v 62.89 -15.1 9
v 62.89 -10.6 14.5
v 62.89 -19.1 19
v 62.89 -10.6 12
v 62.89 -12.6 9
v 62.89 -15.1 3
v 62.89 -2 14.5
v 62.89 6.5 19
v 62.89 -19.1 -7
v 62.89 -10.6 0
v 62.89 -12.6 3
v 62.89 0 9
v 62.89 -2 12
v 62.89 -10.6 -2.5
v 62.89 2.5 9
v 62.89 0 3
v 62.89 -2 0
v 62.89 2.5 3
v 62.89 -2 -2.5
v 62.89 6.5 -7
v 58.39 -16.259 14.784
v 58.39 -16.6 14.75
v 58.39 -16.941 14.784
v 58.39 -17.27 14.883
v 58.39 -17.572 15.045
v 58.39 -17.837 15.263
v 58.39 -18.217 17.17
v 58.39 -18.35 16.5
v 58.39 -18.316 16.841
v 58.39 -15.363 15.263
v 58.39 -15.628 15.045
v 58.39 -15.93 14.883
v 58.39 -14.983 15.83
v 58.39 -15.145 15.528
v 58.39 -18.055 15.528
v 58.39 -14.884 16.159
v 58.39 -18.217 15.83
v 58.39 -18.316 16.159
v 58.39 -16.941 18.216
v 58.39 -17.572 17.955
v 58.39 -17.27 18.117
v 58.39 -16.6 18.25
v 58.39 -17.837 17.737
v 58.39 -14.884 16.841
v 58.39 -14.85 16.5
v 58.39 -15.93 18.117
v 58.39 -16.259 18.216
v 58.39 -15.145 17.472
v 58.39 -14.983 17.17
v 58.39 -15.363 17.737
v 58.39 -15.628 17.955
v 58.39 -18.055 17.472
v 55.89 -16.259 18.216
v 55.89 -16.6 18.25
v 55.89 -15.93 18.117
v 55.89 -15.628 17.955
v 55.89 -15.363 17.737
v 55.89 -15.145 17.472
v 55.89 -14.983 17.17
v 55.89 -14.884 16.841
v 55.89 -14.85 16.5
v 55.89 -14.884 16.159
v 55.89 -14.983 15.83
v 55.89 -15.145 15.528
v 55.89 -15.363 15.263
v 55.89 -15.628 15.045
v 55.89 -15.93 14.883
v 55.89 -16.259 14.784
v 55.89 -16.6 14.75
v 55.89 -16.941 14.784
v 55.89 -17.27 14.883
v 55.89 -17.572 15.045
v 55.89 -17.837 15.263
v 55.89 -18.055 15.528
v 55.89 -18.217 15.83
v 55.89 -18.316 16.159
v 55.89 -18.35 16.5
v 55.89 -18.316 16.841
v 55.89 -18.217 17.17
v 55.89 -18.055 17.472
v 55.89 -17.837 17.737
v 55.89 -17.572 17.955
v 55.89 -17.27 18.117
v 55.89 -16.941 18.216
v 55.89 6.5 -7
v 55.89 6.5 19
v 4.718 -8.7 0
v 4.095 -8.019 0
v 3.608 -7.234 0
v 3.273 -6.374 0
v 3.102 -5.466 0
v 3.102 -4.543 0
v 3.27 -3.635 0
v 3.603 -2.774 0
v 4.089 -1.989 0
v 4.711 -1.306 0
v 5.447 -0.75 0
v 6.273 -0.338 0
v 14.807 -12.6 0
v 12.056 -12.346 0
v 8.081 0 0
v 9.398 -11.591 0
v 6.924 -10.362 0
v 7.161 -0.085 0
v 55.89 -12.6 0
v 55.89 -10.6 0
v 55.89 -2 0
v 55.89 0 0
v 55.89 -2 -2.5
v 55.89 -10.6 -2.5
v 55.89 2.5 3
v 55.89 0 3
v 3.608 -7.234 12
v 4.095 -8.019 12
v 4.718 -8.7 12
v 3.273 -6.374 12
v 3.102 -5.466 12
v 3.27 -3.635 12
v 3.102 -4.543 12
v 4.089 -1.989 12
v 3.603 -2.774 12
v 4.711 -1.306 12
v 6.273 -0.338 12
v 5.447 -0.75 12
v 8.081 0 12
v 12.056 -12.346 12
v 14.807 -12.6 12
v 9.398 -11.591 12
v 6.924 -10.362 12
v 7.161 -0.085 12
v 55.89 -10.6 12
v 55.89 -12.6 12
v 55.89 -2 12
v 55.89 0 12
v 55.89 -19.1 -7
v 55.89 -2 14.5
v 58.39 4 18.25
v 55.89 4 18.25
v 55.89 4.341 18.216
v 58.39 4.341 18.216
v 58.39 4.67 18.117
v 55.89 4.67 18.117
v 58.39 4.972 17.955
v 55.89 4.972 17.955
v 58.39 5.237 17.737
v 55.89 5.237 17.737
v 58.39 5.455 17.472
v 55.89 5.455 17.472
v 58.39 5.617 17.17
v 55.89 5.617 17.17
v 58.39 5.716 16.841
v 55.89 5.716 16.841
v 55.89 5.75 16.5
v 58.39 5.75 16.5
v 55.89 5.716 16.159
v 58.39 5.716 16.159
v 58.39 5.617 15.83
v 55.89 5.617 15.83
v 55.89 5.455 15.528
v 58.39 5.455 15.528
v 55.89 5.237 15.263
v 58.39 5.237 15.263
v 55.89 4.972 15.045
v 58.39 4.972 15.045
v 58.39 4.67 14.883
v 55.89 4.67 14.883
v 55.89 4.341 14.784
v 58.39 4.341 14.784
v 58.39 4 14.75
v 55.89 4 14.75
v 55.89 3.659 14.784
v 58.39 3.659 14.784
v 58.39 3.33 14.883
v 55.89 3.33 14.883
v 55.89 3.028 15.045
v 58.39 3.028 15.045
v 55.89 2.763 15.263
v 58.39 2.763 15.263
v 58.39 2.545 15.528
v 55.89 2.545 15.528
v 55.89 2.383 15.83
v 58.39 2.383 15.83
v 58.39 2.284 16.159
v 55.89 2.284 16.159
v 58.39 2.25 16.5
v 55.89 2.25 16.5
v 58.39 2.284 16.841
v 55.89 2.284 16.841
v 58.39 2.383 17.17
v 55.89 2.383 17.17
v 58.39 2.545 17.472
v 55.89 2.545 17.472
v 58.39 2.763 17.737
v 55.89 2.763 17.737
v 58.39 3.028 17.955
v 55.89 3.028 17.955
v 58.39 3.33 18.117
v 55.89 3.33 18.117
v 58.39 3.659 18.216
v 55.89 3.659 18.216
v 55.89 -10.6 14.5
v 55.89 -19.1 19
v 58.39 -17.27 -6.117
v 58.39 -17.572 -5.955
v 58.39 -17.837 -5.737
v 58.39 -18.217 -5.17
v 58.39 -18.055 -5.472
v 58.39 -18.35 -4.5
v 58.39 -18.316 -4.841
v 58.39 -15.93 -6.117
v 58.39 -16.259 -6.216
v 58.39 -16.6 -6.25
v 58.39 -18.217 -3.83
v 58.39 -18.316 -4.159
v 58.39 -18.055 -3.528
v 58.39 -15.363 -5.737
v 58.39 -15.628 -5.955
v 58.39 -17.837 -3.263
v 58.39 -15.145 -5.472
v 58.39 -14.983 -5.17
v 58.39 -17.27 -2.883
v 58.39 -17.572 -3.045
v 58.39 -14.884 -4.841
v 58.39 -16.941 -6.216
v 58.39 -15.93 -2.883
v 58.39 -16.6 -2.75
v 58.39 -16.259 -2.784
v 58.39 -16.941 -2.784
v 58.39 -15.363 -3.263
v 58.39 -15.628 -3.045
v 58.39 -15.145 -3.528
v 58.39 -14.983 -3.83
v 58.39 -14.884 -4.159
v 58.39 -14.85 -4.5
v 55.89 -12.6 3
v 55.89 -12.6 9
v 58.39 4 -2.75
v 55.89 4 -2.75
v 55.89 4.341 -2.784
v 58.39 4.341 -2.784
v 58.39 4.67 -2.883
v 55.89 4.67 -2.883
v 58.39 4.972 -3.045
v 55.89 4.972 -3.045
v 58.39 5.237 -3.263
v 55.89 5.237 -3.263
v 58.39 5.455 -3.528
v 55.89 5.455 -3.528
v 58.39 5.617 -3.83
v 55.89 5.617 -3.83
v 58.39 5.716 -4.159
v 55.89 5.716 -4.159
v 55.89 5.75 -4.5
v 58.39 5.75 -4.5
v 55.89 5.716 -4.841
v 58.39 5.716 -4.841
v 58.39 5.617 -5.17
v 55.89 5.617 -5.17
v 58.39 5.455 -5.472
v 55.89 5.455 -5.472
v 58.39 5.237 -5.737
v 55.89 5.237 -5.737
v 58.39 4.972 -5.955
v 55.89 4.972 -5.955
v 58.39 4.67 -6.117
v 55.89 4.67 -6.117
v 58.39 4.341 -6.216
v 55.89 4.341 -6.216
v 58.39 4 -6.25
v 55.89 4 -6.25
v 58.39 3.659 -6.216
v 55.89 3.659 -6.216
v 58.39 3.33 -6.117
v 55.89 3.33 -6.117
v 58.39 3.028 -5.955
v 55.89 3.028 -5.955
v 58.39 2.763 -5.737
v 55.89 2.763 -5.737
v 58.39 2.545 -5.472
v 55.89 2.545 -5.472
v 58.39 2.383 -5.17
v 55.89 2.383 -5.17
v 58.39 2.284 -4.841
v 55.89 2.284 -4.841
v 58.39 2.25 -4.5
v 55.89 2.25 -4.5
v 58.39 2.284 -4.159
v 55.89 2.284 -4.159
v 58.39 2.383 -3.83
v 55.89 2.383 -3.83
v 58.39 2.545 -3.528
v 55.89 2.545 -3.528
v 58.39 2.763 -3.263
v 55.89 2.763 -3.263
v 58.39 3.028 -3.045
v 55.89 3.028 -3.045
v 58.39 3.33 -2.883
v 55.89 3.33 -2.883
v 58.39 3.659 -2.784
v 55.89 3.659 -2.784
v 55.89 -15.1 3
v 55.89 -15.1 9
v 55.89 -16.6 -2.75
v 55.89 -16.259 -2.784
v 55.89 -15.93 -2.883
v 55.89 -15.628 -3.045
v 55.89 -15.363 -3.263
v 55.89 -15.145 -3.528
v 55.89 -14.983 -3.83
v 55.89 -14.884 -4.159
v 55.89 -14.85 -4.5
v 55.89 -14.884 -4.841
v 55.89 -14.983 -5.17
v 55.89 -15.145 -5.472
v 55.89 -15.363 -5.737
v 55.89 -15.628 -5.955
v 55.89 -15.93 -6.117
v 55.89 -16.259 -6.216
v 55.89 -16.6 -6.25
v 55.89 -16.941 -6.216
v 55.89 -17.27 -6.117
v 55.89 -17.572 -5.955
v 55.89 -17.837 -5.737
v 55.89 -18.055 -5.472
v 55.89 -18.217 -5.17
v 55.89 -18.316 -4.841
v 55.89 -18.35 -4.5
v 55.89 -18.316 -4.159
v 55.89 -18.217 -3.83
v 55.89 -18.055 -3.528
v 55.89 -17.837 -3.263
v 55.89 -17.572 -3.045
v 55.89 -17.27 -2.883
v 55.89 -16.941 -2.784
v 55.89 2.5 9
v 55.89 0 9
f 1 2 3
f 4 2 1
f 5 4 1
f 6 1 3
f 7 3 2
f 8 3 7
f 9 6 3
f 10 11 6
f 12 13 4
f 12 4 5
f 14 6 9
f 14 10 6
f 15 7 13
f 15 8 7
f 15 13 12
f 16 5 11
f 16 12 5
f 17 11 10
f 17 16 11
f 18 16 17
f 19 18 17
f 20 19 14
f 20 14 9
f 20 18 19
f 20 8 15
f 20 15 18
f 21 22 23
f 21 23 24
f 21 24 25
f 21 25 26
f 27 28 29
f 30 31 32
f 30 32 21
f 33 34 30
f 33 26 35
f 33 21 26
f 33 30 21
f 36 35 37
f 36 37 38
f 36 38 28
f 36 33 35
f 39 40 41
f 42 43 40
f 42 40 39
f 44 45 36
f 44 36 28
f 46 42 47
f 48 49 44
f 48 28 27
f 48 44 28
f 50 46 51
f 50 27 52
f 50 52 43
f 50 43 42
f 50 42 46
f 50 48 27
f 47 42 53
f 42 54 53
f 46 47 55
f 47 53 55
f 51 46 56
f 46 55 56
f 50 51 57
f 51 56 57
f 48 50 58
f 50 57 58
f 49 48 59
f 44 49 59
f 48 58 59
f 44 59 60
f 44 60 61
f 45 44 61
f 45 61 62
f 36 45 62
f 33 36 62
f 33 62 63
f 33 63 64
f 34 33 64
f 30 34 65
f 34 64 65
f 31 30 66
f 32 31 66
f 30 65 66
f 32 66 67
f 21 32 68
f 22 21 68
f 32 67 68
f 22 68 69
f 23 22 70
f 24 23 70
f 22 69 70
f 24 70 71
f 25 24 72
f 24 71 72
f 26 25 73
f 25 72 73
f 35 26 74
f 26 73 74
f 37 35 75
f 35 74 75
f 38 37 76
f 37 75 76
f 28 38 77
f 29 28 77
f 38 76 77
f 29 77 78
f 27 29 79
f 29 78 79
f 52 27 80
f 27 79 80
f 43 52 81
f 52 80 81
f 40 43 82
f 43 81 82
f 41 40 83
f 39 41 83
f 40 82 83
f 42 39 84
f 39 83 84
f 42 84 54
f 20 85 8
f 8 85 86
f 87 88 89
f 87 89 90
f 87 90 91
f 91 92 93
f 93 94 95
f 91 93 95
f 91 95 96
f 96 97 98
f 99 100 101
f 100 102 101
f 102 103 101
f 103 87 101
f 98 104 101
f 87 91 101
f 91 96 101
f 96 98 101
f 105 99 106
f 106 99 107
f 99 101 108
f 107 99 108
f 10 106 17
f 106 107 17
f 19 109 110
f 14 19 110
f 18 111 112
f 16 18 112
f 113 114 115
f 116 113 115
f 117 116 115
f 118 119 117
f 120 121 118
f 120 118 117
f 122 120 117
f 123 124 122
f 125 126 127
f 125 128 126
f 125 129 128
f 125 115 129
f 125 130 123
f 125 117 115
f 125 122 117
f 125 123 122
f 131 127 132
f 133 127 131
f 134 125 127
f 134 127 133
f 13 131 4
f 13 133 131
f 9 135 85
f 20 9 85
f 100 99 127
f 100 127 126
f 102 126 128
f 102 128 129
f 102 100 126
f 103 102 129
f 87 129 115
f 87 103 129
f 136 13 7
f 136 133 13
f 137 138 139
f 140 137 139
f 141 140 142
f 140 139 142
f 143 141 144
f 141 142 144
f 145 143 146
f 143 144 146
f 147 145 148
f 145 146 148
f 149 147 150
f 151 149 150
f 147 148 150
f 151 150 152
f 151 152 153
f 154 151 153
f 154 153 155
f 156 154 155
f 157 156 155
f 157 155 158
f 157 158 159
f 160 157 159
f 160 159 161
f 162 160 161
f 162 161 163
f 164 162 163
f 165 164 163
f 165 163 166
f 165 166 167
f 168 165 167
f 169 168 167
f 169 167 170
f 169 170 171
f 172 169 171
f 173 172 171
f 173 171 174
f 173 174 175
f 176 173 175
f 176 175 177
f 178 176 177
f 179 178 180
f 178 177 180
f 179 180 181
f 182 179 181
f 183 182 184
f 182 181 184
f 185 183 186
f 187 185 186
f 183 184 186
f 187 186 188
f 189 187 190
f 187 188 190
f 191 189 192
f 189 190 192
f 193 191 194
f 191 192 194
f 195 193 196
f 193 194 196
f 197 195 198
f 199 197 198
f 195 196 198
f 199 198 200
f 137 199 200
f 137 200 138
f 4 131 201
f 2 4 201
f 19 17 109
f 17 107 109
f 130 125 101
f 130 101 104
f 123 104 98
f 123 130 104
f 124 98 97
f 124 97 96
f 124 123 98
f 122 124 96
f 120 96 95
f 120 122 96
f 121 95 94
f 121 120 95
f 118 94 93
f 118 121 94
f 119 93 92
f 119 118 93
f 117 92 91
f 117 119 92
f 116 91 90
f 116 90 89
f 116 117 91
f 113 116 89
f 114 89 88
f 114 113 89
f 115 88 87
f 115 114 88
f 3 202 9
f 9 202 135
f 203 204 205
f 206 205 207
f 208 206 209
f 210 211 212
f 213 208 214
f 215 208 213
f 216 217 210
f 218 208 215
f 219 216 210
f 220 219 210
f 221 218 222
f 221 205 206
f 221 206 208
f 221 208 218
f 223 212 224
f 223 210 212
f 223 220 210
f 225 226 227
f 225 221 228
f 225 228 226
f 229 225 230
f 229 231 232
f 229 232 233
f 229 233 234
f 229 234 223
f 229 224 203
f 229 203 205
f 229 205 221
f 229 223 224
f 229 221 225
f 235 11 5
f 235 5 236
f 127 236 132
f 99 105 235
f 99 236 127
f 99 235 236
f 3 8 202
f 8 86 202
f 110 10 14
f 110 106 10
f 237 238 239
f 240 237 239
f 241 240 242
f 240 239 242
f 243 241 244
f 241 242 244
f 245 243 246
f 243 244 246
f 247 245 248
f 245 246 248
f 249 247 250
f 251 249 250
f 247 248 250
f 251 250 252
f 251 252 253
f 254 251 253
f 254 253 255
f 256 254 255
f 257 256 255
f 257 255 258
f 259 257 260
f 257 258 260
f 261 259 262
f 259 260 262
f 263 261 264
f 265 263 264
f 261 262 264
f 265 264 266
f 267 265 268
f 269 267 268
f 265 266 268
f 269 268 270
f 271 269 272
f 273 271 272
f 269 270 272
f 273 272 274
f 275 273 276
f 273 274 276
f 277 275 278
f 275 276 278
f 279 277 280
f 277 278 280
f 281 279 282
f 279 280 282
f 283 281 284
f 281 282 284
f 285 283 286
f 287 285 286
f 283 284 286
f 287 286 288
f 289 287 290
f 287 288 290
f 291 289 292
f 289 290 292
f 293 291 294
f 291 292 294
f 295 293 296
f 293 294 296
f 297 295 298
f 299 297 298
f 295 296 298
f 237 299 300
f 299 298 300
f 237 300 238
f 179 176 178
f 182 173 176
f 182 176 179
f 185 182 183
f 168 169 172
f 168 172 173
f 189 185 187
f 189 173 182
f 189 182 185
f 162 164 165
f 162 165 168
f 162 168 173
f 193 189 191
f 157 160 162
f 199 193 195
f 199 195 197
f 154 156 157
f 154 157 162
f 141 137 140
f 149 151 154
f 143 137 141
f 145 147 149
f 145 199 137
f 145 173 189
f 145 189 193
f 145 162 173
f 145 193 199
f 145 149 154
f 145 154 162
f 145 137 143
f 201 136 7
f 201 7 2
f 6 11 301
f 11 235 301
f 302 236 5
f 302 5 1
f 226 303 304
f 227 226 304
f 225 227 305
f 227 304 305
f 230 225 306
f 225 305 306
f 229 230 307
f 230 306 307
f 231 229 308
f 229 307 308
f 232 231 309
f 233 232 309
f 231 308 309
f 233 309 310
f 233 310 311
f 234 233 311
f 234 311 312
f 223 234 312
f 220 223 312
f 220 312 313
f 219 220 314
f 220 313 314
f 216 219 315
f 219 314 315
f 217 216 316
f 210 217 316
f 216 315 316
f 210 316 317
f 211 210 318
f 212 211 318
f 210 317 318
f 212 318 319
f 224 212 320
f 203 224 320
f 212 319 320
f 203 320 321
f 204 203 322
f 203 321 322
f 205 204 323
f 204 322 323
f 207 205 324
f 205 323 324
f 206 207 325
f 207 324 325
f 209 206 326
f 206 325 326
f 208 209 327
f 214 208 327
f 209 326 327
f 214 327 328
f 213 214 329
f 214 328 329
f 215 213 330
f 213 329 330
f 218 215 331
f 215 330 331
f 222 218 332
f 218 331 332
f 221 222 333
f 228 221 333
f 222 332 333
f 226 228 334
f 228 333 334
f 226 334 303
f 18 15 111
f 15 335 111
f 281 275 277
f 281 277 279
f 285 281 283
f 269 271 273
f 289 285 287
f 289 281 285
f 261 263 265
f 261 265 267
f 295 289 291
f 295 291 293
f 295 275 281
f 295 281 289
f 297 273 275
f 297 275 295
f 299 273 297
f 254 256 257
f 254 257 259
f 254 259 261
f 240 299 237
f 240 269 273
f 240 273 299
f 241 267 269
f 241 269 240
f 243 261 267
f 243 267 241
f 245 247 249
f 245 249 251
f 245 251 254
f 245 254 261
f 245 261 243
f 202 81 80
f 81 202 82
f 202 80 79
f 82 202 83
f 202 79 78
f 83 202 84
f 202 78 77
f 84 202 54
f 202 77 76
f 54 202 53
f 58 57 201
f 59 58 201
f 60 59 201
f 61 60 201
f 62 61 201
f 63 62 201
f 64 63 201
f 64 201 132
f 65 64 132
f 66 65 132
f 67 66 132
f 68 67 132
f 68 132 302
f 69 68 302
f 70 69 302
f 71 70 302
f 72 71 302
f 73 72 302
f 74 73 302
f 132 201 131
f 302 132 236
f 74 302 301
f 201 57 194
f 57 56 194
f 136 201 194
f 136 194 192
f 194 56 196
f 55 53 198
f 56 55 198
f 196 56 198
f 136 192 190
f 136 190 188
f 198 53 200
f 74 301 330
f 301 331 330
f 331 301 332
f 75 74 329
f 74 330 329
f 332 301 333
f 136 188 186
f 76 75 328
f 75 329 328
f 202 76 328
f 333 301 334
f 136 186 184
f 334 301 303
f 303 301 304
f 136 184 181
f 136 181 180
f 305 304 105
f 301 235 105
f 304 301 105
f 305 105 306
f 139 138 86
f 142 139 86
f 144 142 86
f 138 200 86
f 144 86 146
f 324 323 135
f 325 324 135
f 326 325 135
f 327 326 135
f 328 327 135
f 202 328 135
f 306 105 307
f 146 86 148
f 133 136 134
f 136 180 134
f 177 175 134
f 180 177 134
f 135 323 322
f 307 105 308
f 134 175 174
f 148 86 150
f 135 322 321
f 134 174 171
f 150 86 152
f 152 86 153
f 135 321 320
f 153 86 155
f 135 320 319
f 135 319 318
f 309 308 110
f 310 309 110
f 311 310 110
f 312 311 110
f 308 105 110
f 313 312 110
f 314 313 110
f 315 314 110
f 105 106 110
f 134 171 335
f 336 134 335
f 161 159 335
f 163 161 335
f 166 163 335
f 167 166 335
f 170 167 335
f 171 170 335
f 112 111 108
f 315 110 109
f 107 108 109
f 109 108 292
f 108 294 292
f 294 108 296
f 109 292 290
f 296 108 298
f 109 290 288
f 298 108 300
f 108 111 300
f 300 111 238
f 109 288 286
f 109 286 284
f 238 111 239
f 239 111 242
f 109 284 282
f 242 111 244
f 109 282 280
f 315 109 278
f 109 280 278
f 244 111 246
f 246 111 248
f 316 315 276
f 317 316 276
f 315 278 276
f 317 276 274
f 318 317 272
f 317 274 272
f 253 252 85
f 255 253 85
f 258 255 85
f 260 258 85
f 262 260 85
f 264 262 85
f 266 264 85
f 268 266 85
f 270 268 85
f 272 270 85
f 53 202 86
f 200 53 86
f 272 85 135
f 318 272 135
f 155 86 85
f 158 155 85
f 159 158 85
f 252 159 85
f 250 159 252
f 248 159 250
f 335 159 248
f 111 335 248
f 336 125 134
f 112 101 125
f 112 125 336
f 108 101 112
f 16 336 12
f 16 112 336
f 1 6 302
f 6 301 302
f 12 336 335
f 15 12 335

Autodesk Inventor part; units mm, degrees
ref_plane "YZ Plane" through (0, 0, 0) normal (1, 0, 0) x (0, 1, 0)
ref_plane "XZ Plane" through (0, 0, 0) normal (0, 1, 0) x (-1, 0, 0)
ref_plane "XY Plane" through (0, 0, 0) normal (0, 0, 1) x (1, 0, 0)
sketch "Sketch5" plane through (0, 0, 0) normal (0, 0, 1) x (1, 0, 0)
  line L0 (48.5, 0) -> (3.8, 0)
  line L1 (48.5, -12.6) -> (3.8, -12.6)
  line L2 (3.8, -12.6) -> (0, -12.6)
  line L3 (0, -12.6) -> (0, 0)
  line L4 (0, 0) -> (7.8, 0)
  line L5 (38.5, 0) -> (38.5, -12.6)
  line L6 (37.5, -12.6) -> (37.5, 0)
  line L7 (0, -45.1294) -> (0, -34.3361)
  line L8 (0, -34.3361) -> (38.5, -34.3361)
  line L9 (38.5, -34.3361) -> (38.5, -45.1294)
  line L10 (38.5, -45.1294) -> (0, -45.1294)
  line L11 (38.5, -42.4105) -> (39.5, -42.4105)
  line L12 (39.5, -42.4105) -> (39.5, -38.1261)
  line L13 (39.5, -38.1261) -> (38.5, -38.1261)
  line L14 (39.5, -42.4105) -> (39.5, -49.5786)
  line L15 (39.5, -49.5786) -> (45, -49.5786)
  line L16 (45, -49.5786) -> (45, -34.3361)
  line L17 (45, -34.3361) -> (39.5, -34.3361)
  line L18 (39.5, -34.3361) -> (39.5, -38.1261)
  line L19 (48.5, 0) -> (55.8897, 0)
  line L20 (55.8897, 0) -> (55.8897, -12.6)
  line L21 (55.8897, -12.6) -> (48.5, -12.6)
  point P0 (7.8, 0)
  point P1 (39, -42.4105)
  dimension "d63" = 44.7
  dimension "d71" = 0
  dimension "d97" = 12.6
  dimension "d123" = 1
  dimension "d124" = 37.5
  dimension "d125" = 38.5
  dimension "d127" = 1
  dimension "d128" = 5.5
extrude "Extrusion2" add sketch "Sketch5" along normal blind 12 contours L19 L20 L21 L1 L5 L0 | L5 L1 L6 L0 | L6 L1 L2 L3 L4 L0
fillet "Fillet2" radius 15 1 edges at (0, -12.6, 6)
fillet "Rundung3" radius 5 1 edges at (0, 0, 6)
sketch "Skizze17" plane through (55.8897, -12.6, 0) normal (1, 0, 0) x (0, 0, -1)
  line L0 (-19, -6.5) -> (7, -6.5)
  line L1 (7, -6.5) -> (7, 19.1)
  line L2 (7, 19.1) -> (-19, 19.1)
  line L3 (-19, 19.1) -> (-19, -6.5)
  line L4 (-19, -6.5) -> (7, 19.1) construction
  line L5 (7, -6.5) -> (-19, 19.1) construction
  line L6 (0, 12.6) -> (-12, 12.6) projected
  line L7 (0, 0) -> (-12, 0) projected
  line L8 (0, 0) -> (0, 12.6) projected
  line L9 (-12, 0) -> (-12, 12.6) projected
  point P0 (-6, 6.3)
  point P1 (7, 6.3)
  dimension "d151" = 26
  dimension "d152" = 25.6
  dimension "d153" = 6.5
  dimension "d154" = 6.5
  dimension "d155" = 7
  dimension "d156" = 7
extrude "Extrusion12" add sketch "Skizze17" along normal blind 7 contours L3 L2 L1 L0 | L8 L7 L9 L6
sketch "Skizze18" plane through (55.8897, -12.6, 0) normal (-1, 0, 0) x (0, 0, 1)
  circle A0 centre (-4.5, 16.6) radius 1.75
  circle A1 centre (16.5, 16.6) radius 1.75
  circle A2 centre (16.5, -4) radius 1.75
  circle A3 centre (-4.5, -4) radius 1.75
  line L0 (-7, 19.1) -> (19, 19.1) projected
  line L1 (-7, -6.5) -> (-7, 19.1) projected
  line L2 (19, 19.1) -> (19, -6.5) projected
  line L3 (19, -6.5) -> (-7, -6.5) projected
  point P0 (0, 12.6)
  dimension "d135" = 3.5
  dimension "d136" = 2.5
  dimension "d137" = 2.5
  dimension "d138" = 3.5
  dimension "d139" = 2.5
  dimension "d140" = 2.5
  dimension "d141" = 2.5
  dimension "d142" = 2.5
  dimension "d143" = 2.5
  dimension "d144" = 2.5
  dimension "d145" = 3.5
  dimension "d146" = 3.5
extrude "Extrusion13" cut sketch "Skizze18" against normal blind 2.5 contours A0 | A1 | A2 | A3
sketch "Skizze22" plane through (55.8897, -12.6, 0) normal (-1, 0, 0) x (0, 0, 1)
  line L0 (0, 12.6) -> (10, 12.6)
  line L1 (9, 15.1) -> (3, 15.1)
  line L2 (-2.5, 10.6) -> (-2.5, 2)
  line L3 (4.6106, -2.5) -> (9, -2.5)
  line L4 (10, -0.0226) -> (9.9863, -0.0226)
  line L5 (9.9863, 12.8711) -> (10, 12.8711)
  line L6 (14.5, 10.6) -> (14.5, 2)
  line L7 (4.6106, -2.5) -> (3, -2.5)
  line L8 (12, 12.6) -> (0, 12.6) projected
  line L9 (0, 0) -> (0, 12.6) projected
  line L10 (0, 0) -> (0, 12.6)
  line L11 (0, 12.6) -> (12, 12.6)
  line L12 (0, 0) -> (12, 0) projected
  line L13 (0, 0) -> (10, 0)
  line L14 (11.3365, 15.1) -> (11.4, 15.1)
  line L15 (3, 15.1) -> (3, 12.6)
  line L16 (0, 10.6) -> (-2.5, 10.6)
  line L17 (10, 10.6) -> (14.5, 10.6)
  line L18 (9, 12.6) -> (9, 15.1)
  line L19 (0, 2) -> (-2.5, 2)
  line L20 (3, 0) -> (3, -2.5)
  line L21 (9, 0) -> (9, -2.5)
  line L22 (10, 2) -> (14.5, 2)
  line L23 (12, 12.6) -> (12, 3.9) projected
  line L24 (12, 3.9) -> (12, 0) projected
  line L25 (12, 10.6) -> (12, 1.95)
  line L26 (14.5, 2) -> (14.5, 10.6)
  point P0 (9, 13.85)
  point P1 (3, 13.85)
  point P2 (12.25, 2)
  point P3 (12.25, 10.6)
  point P4 (-1.25, 10.6)
  point P5 (-1.25, 2)
  point P6 (3, 0)
  point P7 (0, 2)
  point P8 (3, 12.6)
  point P9 (9, 12.6)
  point P10 (14.5, 6.3)
  point P11 (12, 2)
  dimension "d172" = 0
  dimension "d173" = 2.5
  dimension "d175" = 2.5
  dimension "d176" = 2.5
  dimension "d180" = 3
  dimension "d181" = 3
  dimension "d183" = 2
  dimension "d184" = 2
  dimension "d185" = 2
  dimension "d186" = 2
  dimension "d190" = 2.5
  dimension "d191" = 3
  dimension "d192" = 3
extrude "Extrusion19" cut sketch "Skizze22" against normal blind 10 contours L15 L1 L18 L0 | L9 L19 L2 L16 | L12 L21 L3 L7 L20 | L17 L6 L22 L24 L23
equation "\"l1\" = 8"
properties part number "Maria_Greifer_3D-Druck"
